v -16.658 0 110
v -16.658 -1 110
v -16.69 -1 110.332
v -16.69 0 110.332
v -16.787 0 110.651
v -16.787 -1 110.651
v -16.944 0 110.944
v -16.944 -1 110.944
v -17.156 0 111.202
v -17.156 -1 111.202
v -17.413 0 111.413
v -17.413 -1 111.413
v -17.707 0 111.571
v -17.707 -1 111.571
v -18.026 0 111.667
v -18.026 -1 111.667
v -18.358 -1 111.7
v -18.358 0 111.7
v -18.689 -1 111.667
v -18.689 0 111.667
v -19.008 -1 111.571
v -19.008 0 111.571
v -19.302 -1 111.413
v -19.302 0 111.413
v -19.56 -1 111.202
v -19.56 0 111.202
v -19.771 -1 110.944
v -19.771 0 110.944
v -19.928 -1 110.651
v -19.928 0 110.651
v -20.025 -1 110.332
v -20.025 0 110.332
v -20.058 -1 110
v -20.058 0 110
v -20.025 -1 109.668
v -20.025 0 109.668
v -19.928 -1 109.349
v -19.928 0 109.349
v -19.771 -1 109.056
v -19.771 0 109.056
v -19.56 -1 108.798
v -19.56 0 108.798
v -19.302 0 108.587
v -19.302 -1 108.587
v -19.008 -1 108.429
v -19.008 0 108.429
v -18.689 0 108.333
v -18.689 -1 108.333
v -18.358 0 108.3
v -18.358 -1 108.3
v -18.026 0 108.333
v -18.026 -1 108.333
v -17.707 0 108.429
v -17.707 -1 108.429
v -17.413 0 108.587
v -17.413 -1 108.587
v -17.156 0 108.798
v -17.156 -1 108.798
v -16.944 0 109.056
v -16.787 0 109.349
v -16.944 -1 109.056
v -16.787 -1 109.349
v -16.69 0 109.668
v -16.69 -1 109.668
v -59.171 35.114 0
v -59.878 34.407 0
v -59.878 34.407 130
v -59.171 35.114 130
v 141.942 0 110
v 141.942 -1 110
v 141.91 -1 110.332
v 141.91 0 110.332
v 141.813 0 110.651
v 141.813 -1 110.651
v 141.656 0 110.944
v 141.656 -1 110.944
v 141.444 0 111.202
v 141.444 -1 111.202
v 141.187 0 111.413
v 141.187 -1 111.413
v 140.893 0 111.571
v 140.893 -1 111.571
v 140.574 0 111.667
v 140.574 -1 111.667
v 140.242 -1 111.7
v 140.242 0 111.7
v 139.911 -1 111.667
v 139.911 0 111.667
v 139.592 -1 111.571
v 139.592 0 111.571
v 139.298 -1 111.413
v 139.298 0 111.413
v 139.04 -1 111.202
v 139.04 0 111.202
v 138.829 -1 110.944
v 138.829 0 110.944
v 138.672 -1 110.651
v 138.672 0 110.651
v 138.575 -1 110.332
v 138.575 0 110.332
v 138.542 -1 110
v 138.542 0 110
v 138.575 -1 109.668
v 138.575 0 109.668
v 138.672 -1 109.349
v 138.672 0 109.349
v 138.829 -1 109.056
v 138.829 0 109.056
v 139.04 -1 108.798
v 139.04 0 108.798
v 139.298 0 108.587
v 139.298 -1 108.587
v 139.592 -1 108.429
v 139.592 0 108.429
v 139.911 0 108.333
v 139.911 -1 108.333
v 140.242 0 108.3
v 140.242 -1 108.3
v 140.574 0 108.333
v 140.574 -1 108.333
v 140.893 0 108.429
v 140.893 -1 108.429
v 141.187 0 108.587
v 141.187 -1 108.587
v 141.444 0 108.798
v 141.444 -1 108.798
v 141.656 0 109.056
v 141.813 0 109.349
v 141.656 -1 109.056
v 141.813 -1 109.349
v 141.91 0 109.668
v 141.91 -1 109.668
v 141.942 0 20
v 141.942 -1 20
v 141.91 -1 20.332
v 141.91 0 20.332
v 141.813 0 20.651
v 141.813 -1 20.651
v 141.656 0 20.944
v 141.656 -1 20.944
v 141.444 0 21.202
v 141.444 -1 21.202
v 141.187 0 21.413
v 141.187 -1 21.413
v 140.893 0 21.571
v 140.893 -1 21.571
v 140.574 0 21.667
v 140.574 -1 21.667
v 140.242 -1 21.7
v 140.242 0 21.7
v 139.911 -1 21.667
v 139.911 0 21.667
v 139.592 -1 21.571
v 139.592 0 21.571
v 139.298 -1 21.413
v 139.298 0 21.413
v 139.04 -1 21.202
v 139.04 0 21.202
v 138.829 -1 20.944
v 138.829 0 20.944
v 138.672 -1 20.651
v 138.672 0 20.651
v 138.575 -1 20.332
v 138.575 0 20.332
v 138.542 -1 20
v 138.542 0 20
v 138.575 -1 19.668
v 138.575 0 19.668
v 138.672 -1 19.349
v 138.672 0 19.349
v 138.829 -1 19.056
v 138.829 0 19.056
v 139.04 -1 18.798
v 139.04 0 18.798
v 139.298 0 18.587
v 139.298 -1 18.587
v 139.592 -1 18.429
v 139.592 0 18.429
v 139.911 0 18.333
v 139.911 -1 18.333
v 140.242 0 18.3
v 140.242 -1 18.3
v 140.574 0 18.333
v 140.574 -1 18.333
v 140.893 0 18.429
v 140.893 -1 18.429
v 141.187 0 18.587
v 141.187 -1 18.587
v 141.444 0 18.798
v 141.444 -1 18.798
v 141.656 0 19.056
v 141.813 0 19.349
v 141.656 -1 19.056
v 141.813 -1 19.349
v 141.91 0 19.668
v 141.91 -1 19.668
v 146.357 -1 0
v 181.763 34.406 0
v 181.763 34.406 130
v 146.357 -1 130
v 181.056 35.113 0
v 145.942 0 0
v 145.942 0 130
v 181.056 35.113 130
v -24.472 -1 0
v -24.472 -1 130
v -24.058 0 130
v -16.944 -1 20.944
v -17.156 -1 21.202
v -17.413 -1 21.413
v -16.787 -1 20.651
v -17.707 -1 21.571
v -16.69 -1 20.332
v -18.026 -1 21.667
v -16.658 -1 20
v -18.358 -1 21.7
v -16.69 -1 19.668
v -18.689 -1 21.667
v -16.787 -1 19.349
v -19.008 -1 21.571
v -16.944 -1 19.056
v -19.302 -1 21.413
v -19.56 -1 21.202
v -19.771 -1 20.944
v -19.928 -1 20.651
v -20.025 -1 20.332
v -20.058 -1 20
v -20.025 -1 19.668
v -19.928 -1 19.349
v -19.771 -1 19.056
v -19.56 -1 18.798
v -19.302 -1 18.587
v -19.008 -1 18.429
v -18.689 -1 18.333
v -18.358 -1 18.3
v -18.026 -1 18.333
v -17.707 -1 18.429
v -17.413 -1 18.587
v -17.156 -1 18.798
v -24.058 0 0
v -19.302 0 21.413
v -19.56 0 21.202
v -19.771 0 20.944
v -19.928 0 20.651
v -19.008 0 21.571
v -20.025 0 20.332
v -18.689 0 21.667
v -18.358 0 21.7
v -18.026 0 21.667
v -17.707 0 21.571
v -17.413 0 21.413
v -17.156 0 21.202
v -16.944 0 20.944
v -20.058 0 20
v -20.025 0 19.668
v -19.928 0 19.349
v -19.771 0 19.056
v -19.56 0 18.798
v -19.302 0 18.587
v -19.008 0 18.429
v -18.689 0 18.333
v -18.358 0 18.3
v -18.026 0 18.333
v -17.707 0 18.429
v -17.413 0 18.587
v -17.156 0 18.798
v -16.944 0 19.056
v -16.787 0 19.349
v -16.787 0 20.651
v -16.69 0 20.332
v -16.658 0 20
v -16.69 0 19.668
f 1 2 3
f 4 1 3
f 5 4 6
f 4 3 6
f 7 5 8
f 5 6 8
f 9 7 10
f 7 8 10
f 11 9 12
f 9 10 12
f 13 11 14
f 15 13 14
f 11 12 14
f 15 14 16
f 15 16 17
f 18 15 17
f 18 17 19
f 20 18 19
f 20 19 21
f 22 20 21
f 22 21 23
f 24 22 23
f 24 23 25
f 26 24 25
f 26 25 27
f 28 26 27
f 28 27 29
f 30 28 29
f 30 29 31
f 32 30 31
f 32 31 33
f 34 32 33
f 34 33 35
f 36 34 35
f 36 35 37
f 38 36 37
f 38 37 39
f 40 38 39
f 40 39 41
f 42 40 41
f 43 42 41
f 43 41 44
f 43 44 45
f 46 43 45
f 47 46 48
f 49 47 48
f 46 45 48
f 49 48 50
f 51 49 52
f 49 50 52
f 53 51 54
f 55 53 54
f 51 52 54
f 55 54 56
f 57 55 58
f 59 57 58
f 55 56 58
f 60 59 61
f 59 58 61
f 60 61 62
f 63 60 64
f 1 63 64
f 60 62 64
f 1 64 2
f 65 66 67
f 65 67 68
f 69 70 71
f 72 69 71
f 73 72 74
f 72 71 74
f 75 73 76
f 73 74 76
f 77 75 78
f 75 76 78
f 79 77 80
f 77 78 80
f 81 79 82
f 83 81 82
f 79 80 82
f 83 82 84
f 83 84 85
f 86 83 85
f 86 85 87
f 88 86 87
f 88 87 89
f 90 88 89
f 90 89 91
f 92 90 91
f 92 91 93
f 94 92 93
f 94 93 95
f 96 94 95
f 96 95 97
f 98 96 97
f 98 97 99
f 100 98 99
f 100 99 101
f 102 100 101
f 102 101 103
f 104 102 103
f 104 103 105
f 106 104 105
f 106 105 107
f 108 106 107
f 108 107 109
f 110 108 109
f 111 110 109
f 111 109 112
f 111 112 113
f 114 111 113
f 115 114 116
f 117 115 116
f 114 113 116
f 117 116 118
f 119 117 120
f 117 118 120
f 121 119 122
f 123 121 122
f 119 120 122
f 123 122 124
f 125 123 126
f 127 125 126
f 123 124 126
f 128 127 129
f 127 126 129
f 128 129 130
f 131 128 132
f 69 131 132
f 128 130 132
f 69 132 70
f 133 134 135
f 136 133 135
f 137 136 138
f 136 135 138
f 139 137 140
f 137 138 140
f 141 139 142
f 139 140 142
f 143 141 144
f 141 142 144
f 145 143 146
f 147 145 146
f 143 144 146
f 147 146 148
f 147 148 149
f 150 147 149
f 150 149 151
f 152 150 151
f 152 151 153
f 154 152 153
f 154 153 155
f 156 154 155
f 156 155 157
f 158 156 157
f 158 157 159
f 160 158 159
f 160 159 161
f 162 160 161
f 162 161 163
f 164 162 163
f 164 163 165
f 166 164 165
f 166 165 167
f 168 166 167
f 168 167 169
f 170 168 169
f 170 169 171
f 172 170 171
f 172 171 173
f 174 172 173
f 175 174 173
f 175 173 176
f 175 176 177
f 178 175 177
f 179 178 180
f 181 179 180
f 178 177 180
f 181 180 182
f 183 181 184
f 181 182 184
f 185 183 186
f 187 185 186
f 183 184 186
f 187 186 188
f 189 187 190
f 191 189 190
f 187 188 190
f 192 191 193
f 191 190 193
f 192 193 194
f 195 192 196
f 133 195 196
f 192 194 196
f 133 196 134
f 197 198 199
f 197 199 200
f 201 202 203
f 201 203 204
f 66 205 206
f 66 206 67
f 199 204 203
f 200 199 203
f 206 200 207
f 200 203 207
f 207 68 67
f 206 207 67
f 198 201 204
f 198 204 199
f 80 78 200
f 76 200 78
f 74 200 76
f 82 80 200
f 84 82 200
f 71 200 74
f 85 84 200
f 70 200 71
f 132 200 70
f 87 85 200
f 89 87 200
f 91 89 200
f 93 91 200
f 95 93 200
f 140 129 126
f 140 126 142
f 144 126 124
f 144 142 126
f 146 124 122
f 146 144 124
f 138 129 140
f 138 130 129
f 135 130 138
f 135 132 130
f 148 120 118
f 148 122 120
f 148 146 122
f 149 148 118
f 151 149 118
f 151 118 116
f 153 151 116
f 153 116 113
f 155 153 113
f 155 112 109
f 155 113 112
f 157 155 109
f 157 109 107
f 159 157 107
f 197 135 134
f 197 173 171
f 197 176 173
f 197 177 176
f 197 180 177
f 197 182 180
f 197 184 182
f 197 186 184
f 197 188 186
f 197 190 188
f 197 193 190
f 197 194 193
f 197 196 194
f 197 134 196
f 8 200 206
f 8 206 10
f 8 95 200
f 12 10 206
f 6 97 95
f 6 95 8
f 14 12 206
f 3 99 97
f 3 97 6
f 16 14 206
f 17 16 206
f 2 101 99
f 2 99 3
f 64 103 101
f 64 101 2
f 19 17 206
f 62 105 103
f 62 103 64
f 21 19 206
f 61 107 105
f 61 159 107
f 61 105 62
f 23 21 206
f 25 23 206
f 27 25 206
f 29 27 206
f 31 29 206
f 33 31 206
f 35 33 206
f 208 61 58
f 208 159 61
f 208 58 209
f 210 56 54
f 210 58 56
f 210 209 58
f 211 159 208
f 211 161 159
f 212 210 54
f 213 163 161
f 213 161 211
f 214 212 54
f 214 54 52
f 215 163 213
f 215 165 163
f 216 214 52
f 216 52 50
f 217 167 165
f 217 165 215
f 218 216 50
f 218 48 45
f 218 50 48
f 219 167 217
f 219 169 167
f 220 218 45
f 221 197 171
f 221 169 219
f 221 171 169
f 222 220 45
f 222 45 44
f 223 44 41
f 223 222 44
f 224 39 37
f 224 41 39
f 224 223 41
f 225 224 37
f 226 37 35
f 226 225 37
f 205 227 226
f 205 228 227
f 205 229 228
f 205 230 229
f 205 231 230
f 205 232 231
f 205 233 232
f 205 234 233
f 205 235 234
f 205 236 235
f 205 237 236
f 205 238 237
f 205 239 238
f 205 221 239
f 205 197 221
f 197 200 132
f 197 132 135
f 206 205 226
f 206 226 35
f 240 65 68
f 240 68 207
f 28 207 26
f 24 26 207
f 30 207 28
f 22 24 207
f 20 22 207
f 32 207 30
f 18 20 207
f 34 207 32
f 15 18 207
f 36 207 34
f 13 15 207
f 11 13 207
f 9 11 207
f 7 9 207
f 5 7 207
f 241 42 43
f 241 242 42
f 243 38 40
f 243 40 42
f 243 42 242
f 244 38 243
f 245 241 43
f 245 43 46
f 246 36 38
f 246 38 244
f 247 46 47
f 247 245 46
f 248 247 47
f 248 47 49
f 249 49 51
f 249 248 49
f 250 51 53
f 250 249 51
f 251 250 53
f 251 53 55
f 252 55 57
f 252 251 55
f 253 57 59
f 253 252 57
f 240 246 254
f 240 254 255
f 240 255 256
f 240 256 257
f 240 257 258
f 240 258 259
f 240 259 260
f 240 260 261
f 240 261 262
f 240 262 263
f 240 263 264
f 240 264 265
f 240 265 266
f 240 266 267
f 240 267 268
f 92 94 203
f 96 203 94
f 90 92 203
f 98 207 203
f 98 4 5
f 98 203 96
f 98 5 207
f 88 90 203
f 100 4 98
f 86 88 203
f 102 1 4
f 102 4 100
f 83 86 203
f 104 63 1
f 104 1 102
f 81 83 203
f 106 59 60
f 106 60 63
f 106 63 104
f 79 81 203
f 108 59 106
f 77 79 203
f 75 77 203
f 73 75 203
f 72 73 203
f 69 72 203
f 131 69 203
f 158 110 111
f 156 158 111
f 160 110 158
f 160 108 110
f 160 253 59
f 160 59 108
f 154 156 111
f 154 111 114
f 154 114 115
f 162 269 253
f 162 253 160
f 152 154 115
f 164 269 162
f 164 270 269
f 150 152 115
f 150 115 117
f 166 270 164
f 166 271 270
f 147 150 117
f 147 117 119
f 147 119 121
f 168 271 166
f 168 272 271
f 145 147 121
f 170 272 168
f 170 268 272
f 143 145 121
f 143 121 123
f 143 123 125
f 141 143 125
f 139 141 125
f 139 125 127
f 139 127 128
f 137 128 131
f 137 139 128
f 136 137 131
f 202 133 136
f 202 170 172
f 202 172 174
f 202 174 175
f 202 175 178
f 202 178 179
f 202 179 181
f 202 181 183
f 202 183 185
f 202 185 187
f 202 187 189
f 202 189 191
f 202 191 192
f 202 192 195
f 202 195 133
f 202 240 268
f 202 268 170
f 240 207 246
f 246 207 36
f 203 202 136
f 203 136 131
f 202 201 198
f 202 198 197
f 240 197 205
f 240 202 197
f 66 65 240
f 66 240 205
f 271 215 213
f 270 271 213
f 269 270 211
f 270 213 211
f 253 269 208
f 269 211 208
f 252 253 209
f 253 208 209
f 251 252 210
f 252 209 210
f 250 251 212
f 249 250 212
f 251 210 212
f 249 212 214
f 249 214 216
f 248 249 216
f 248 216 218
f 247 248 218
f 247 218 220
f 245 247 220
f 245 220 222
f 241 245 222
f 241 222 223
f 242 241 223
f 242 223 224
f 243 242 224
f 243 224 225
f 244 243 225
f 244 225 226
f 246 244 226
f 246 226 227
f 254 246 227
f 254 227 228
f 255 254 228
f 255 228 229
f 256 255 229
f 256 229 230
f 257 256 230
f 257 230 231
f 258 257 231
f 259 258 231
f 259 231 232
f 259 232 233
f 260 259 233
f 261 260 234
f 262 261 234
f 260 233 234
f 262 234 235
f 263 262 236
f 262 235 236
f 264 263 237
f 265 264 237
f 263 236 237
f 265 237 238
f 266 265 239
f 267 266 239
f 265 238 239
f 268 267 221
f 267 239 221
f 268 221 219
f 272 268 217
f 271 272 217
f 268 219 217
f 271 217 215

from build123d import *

# Parameters (mm, degrees)
EXTRU_MINCE1_DEPTH = 130
D_GAGEMENT_M32_D   = 3.4


with BuildPart() as part:
    # Esquisse2 → Extru.-Mince1 (new body)
    with BuildSketch(Plane.XY):
        Polygon((-59.170699115, 35.114), (-24.057682042, 0), (145.942317958, 0), (181.056317958, 35.113017073), (181.763414842, 34.405900395), (146.356523321, -1), (-24.471903803, -1), (-59.877815794, 34.406903116), align=None)
    extrude(amount=EXTRU_MINCE1_DEPTH)

    # Dégagement M32 (through all)
    with Locations(Plane(origin=(0, 0, 0), x_dir=(-1, 0, 0), z_dir=(0, 1, 0))):
        with Locations((18.357682042, 20), (-140.242317958, 20), (-140.242317958, 110), (18.357682042, 110)):
            Hole(D_GAGEMENT_M32_D / 2)


solid = part.part
